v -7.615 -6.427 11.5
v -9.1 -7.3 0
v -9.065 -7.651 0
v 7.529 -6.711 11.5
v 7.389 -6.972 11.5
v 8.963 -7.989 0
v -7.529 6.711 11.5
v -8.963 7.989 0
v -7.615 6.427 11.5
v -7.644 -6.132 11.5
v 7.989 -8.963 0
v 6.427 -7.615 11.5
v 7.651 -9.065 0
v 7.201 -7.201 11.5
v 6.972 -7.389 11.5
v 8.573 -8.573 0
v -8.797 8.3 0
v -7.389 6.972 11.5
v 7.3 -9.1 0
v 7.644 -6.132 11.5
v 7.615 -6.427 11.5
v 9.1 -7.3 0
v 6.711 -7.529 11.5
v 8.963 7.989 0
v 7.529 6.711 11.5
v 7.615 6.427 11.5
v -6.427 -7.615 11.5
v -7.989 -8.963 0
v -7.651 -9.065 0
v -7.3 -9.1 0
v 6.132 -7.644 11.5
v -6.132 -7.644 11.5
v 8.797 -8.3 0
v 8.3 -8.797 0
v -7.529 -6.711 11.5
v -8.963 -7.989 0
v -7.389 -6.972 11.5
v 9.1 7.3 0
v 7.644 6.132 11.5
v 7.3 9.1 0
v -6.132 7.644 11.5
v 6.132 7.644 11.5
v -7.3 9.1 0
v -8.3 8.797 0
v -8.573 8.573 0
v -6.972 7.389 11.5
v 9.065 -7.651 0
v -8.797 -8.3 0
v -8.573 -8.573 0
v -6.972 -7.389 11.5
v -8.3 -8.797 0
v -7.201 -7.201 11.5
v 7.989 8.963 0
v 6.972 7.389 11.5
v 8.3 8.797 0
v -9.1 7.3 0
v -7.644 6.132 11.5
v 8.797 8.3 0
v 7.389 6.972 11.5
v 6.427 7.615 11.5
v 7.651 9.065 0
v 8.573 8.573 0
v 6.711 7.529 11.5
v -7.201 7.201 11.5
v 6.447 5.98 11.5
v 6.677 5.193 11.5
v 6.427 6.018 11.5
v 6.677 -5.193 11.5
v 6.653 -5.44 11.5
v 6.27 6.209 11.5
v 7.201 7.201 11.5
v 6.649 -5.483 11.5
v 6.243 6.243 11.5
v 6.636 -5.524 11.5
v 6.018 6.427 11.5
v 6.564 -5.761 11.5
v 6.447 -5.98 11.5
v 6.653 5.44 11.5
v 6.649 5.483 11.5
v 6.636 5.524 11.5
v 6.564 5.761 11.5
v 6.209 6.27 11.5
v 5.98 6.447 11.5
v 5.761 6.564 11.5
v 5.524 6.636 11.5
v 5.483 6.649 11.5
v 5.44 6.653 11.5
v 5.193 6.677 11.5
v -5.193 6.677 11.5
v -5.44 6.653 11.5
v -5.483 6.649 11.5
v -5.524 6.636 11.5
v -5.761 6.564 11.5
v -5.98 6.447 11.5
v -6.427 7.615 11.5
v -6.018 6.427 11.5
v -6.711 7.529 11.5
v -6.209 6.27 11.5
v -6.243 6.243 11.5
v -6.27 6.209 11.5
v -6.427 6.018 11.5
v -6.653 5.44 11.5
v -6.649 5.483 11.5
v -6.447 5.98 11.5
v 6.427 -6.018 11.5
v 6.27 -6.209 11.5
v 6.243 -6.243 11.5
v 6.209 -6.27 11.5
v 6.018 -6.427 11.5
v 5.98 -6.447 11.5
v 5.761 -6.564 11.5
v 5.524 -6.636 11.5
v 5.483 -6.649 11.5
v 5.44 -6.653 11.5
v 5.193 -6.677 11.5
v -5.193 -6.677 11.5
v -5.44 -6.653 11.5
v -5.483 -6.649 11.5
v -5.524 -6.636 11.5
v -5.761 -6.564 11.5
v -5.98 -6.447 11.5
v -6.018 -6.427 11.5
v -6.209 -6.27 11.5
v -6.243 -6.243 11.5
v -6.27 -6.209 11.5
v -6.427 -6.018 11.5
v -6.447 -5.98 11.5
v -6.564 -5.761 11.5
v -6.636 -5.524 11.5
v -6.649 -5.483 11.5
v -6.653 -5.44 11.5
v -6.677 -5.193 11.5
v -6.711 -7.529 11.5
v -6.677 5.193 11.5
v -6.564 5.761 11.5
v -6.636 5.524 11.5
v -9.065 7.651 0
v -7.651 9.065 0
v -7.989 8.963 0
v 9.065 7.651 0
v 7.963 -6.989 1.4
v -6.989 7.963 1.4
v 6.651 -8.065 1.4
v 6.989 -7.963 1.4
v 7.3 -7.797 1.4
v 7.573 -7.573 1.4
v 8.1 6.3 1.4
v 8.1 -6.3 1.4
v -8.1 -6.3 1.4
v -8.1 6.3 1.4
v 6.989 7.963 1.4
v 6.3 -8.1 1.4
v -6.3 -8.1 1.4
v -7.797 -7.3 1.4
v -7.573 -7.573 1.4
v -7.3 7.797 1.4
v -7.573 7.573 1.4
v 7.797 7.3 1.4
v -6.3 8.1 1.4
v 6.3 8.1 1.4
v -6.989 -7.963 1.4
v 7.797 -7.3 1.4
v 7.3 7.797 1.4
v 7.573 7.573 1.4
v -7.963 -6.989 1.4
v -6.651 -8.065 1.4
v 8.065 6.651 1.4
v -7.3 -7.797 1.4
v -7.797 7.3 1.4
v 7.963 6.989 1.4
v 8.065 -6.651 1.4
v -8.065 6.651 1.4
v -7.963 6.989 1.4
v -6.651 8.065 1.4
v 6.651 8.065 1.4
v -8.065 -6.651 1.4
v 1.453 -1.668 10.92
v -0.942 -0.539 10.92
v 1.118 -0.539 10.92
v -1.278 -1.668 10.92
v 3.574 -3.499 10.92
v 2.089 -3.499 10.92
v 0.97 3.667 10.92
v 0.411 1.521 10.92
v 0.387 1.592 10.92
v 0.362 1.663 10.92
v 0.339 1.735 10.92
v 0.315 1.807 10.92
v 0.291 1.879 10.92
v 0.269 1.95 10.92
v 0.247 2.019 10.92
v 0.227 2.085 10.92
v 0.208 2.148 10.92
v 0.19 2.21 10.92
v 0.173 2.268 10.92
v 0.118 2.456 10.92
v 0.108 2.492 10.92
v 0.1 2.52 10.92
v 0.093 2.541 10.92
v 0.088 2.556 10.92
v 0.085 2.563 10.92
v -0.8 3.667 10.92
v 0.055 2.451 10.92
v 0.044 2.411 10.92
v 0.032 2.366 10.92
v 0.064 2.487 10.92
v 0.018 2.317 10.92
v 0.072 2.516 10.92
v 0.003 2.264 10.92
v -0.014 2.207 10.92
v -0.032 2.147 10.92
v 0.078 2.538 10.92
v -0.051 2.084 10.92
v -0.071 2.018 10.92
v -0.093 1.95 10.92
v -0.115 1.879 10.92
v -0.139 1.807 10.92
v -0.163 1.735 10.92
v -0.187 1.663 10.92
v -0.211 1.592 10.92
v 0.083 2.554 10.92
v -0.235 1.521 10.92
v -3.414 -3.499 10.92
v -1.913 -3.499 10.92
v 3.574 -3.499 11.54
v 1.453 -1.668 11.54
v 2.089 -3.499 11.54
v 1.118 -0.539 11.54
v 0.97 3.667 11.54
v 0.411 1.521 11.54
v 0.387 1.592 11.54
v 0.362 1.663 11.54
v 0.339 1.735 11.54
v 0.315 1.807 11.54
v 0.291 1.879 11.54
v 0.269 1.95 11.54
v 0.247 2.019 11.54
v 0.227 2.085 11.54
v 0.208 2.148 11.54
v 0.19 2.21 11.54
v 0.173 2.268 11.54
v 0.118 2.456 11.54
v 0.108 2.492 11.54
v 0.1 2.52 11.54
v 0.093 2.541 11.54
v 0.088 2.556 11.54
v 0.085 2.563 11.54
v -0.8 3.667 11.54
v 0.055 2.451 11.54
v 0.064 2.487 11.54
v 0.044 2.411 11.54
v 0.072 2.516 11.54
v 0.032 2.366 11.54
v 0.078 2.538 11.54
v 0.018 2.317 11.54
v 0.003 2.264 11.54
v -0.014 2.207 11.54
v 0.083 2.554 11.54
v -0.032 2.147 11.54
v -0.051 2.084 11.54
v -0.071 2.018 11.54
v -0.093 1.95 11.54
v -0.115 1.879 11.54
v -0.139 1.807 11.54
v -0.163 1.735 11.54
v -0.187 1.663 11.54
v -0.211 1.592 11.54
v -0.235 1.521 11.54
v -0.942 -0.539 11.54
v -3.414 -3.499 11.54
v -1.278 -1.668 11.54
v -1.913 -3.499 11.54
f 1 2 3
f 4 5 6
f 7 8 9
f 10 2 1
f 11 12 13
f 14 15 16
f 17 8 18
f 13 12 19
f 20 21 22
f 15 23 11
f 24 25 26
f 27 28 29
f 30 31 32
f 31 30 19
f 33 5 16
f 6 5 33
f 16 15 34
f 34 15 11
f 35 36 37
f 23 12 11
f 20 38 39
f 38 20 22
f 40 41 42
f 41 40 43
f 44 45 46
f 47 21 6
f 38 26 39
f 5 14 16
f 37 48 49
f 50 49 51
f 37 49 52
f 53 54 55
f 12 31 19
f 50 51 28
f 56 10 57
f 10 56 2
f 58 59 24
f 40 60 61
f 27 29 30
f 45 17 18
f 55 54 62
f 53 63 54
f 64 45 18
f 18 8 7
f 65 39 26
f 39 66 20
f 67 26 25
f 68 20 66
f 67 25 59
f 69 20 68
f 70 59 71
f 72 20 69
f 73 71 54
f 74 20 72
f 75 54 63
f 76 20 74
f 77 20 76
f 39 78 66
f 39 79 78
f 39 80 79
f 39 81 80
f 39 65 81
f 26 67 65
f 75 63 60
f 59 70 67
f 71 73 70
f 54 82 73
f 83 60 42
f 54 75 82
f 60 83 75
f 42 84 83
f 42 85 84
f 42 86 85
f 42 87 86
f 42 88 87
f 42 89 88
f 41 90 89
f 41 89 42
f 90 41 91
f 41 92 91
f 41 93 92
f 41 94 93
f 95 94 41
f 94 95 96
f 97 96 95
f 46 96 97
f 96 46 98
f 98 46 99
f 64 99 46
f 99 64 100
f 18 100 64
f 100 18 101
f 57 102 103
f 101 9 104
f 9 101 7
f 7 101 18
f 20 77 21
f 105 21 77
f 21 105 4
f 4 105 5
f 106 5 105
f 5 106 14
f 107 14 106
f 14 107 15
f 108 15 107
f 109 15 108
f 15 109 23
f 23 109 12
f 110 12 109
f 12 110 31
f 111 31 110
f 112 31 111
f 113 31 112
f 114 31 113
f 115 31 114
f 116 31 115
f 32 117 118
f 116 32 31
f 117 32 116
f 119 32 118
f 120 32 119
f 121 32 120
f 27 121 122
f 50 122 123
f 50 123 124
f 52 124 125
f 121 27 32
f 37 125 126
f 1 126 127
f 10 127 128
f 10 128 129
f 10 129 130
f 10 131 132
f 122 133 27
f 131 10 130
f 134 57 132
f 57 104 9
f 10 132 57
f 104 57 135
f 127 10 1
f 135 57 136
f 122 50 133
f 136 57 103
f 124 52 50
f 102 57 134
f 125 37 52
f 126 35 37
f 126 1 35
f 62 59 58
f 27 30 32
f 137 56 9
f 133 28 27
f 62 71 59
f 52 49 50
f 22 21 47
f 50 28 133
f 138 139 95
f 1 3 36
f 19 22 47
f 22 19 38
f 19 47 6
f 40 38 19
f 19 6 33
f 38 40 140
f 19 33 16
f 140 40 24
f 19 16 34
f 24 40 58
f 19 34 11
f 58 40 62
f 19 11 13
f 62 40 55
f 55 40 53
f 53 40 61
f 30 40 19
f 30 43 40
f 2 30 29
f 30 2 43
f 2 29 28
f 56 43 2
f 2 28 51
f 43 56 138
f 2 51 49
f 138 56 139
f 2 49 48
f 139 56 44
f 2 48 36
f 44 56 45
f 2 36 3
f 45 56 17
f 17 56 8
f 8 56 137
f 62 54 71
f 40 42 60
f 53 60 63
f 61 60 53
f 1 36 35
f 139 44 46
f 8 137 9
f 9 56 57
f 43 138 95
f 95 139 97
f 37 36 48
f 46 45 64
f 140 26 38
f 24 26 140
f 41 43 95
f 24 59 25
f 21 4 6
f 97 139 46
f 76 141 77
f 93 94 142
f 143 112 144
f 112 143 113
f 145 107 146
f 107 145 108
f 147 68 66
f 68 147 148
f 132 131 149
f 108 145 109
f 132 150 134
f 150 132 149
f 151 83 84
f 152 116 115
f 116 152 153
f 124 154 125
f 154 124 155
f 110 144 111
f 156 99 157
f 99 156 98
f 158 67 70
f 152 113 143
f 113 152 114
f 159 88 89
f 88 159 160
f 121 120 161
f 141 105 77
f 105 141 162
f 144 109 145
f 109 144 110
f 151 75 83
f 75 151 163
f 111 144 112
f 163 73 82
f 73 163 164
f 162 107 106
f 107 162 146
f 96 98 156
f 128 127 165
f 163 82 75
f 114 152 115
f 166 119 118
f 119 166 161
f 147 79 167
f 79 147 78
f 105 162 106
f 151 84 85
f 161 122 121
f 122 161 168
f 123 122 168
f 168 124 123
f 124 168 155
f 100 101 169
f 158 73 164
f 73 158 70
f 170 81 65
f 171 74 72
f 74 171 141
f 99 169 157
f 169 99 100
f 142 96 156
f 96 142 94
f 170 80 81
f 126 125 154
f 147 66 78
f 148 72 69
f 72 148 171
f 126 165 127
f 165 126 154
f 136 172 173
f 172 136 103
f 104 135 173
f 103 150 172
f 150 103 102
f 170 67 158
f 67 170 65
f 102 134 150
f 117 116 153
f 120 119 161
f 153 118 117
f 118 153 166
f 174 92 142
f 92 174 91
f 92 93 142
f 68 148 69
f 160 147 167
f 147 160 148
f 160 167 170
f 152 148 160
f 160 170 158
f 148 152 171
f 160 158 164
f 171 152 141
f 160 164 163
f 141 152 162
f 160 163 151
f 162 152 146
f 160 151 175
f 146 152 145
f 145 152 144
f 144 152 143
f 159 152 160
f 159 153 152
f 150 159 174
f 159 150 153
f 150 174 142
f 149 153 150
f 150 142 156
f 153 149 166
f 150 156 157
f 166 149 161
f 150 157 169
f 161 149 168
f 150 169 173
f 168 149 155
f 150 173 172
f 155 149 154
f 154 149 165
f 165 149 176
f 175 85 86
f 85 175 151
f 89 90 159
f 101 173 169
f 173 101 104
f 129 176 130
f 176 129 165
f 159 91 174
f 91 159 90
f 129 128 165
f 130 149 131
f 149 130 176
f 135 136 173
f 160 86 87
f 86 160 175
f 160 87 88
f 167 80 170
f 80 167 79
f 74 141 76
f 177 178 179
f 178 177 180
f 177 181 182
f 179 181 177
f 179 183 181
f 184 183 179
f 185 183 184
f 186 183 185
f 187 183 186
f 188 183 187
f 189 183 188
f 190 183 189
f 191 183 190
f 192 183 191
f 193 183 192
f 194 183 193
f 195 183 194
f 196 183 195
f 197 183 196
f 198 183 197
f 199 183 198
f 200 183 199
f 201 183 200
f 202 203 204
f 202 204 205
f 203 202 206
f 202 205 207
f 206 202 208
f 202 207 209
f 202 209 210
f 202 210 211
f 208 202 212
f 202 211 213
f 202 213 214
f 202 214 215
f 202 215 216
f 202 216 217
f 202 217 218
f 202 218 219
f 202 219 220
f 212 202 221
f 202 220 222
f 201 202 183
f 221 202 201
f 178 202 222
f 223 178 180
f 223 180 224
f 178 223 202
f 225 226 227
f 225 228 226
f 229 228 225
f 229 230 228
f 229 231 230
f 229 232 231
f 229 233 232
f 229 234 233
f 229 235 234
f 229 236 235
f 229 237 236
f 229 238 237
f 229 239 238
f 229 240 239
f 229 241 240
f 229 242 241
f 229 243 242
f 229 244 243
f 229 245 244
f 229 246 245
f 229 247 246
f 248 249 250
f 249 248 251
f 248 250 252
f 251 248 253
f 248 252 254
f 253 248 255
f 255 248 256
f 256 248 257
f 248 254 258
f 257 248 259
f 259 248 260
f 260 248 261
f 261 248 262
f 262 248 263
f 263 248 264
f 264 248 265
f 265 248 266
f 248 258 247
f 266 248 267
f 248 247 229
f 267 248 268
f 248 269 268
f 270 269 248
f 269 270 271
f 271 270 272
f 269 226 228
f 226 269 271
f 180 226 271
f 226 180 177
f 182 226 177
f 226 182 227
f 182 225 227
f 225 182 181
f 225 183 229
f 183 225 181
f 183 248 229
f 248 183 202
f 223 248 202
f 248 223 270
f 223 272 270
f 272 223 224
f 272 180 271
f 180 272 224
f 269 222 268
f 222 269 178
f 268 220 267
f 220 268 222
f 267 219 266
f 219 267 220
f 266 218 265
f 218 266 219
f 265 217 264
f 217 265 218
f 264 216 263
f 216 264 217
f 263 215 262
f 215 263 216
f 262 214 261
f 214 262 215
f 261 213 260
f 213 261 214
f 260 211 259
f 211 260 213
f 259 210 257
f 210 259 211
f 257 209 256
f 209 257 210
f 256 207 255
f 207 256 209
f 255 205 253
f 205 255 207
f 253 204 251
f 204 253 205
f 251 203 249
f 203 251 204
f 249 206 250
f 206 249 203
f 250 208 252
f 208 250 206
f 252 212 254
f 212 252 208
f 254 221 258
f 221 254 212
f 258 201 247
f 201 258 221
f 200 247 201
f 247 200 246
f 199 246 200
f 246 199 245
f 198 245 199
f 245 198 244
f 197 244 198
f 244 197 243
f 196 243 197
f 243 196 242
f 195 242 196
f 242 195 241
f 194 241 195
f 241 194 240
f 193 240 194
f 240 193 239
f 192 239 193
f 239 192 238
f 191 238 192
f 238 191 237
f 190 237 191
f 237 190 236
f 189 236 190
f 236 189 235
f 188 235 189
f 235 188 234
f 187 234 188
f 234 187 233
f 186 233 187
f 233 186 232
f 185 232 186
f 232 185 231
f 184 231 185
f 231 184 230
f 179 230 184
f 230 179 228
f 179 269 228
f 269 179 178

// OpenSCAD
/*
  MakerWorld Parametric Model Maker practice file.
  Self-contained: no imports, fonts, or assets required.
*/

/* [출력 / Output] */
export_part = "미리보기 / Preview"; // [미리보기 / Preview,키캡 / Keycap,글자 / Legend]

/* [키캡 / Keycap] */
key_count = 1; // [1:1:12]
columns = 4; // [1:1:6]
spacing = 21; // [19:0.1:25]
key_width = 18.2; // [16:0.1:20]
key_height = 11.5; // [8:0.1:15]
corner_radius = 1.8; // [0.5:0.1:3]

/* [글자 / Legend] */
// 한 글자씩 순서대로 입력 / One character per key
legend_text = "ABCD";
font_name = "Liberation Sans:style=Bold";
font_size = 7.5; // [2:0.1:12]
legend_depth = 0.6; // [0.2:0.1:1]
legend_x = 0; // [-5:0.1:5]
legend_y = 0; // [-5:0.1:5]
legend_rotation = 0; // [-180:1:180]

/* [미리보기 색상 / Preview colors] */
keycap_color = [0.08,0.09,0.12];
legend_color = [0.96,0.96,0.96];

/* [Hidden] */
$fn = 32;

function char_at(value, index) = index < len(value) ? value[index] : "";

module rounded_square(size, radius) {
    offset(r=radius) square([size-2*radius,size-2*radius], center=true);
}

module keycap_shell() {
    // A simple printable keycap shell for workflow practice; not a Cherry MX-fit design.
    difference() {
        linear_extrude(height=key_height, scale=0.84)
            rounded_square(key_width, corner_radius);
        translate([0,0,1.4])
            linear_extrude(height=key_height, scale=0.80)
                rounded_square(key_width-2.0, corner_radius);
    }
}

module legend(index) {
    translate([legend_x,legend_y,key_height-legend_depth])
        rotate([0,0,legend_rotation])
            linear_extrude(height=legend_depth+0.02)
                text(char_at(legend_text,index), size=font_size, font=font_name,
                     halign="center", valign="center");
}

module keycap(index) {
    if (export_part == "글자 / Legend") legend(index);
    else if (export_part == "키캡 / Keycap") difference() { keycap_shell(); legend(index); }
    else {
        color(keycap_color) keycap_shell();
        color(legend_color) translate([0,0,0.02]) legend(index);
    }
}

for (i=[0:key_count-1])
    translate([(i % columns)*spacing, -floor(i / columns)*spacing, 0])
        keycap(i);
